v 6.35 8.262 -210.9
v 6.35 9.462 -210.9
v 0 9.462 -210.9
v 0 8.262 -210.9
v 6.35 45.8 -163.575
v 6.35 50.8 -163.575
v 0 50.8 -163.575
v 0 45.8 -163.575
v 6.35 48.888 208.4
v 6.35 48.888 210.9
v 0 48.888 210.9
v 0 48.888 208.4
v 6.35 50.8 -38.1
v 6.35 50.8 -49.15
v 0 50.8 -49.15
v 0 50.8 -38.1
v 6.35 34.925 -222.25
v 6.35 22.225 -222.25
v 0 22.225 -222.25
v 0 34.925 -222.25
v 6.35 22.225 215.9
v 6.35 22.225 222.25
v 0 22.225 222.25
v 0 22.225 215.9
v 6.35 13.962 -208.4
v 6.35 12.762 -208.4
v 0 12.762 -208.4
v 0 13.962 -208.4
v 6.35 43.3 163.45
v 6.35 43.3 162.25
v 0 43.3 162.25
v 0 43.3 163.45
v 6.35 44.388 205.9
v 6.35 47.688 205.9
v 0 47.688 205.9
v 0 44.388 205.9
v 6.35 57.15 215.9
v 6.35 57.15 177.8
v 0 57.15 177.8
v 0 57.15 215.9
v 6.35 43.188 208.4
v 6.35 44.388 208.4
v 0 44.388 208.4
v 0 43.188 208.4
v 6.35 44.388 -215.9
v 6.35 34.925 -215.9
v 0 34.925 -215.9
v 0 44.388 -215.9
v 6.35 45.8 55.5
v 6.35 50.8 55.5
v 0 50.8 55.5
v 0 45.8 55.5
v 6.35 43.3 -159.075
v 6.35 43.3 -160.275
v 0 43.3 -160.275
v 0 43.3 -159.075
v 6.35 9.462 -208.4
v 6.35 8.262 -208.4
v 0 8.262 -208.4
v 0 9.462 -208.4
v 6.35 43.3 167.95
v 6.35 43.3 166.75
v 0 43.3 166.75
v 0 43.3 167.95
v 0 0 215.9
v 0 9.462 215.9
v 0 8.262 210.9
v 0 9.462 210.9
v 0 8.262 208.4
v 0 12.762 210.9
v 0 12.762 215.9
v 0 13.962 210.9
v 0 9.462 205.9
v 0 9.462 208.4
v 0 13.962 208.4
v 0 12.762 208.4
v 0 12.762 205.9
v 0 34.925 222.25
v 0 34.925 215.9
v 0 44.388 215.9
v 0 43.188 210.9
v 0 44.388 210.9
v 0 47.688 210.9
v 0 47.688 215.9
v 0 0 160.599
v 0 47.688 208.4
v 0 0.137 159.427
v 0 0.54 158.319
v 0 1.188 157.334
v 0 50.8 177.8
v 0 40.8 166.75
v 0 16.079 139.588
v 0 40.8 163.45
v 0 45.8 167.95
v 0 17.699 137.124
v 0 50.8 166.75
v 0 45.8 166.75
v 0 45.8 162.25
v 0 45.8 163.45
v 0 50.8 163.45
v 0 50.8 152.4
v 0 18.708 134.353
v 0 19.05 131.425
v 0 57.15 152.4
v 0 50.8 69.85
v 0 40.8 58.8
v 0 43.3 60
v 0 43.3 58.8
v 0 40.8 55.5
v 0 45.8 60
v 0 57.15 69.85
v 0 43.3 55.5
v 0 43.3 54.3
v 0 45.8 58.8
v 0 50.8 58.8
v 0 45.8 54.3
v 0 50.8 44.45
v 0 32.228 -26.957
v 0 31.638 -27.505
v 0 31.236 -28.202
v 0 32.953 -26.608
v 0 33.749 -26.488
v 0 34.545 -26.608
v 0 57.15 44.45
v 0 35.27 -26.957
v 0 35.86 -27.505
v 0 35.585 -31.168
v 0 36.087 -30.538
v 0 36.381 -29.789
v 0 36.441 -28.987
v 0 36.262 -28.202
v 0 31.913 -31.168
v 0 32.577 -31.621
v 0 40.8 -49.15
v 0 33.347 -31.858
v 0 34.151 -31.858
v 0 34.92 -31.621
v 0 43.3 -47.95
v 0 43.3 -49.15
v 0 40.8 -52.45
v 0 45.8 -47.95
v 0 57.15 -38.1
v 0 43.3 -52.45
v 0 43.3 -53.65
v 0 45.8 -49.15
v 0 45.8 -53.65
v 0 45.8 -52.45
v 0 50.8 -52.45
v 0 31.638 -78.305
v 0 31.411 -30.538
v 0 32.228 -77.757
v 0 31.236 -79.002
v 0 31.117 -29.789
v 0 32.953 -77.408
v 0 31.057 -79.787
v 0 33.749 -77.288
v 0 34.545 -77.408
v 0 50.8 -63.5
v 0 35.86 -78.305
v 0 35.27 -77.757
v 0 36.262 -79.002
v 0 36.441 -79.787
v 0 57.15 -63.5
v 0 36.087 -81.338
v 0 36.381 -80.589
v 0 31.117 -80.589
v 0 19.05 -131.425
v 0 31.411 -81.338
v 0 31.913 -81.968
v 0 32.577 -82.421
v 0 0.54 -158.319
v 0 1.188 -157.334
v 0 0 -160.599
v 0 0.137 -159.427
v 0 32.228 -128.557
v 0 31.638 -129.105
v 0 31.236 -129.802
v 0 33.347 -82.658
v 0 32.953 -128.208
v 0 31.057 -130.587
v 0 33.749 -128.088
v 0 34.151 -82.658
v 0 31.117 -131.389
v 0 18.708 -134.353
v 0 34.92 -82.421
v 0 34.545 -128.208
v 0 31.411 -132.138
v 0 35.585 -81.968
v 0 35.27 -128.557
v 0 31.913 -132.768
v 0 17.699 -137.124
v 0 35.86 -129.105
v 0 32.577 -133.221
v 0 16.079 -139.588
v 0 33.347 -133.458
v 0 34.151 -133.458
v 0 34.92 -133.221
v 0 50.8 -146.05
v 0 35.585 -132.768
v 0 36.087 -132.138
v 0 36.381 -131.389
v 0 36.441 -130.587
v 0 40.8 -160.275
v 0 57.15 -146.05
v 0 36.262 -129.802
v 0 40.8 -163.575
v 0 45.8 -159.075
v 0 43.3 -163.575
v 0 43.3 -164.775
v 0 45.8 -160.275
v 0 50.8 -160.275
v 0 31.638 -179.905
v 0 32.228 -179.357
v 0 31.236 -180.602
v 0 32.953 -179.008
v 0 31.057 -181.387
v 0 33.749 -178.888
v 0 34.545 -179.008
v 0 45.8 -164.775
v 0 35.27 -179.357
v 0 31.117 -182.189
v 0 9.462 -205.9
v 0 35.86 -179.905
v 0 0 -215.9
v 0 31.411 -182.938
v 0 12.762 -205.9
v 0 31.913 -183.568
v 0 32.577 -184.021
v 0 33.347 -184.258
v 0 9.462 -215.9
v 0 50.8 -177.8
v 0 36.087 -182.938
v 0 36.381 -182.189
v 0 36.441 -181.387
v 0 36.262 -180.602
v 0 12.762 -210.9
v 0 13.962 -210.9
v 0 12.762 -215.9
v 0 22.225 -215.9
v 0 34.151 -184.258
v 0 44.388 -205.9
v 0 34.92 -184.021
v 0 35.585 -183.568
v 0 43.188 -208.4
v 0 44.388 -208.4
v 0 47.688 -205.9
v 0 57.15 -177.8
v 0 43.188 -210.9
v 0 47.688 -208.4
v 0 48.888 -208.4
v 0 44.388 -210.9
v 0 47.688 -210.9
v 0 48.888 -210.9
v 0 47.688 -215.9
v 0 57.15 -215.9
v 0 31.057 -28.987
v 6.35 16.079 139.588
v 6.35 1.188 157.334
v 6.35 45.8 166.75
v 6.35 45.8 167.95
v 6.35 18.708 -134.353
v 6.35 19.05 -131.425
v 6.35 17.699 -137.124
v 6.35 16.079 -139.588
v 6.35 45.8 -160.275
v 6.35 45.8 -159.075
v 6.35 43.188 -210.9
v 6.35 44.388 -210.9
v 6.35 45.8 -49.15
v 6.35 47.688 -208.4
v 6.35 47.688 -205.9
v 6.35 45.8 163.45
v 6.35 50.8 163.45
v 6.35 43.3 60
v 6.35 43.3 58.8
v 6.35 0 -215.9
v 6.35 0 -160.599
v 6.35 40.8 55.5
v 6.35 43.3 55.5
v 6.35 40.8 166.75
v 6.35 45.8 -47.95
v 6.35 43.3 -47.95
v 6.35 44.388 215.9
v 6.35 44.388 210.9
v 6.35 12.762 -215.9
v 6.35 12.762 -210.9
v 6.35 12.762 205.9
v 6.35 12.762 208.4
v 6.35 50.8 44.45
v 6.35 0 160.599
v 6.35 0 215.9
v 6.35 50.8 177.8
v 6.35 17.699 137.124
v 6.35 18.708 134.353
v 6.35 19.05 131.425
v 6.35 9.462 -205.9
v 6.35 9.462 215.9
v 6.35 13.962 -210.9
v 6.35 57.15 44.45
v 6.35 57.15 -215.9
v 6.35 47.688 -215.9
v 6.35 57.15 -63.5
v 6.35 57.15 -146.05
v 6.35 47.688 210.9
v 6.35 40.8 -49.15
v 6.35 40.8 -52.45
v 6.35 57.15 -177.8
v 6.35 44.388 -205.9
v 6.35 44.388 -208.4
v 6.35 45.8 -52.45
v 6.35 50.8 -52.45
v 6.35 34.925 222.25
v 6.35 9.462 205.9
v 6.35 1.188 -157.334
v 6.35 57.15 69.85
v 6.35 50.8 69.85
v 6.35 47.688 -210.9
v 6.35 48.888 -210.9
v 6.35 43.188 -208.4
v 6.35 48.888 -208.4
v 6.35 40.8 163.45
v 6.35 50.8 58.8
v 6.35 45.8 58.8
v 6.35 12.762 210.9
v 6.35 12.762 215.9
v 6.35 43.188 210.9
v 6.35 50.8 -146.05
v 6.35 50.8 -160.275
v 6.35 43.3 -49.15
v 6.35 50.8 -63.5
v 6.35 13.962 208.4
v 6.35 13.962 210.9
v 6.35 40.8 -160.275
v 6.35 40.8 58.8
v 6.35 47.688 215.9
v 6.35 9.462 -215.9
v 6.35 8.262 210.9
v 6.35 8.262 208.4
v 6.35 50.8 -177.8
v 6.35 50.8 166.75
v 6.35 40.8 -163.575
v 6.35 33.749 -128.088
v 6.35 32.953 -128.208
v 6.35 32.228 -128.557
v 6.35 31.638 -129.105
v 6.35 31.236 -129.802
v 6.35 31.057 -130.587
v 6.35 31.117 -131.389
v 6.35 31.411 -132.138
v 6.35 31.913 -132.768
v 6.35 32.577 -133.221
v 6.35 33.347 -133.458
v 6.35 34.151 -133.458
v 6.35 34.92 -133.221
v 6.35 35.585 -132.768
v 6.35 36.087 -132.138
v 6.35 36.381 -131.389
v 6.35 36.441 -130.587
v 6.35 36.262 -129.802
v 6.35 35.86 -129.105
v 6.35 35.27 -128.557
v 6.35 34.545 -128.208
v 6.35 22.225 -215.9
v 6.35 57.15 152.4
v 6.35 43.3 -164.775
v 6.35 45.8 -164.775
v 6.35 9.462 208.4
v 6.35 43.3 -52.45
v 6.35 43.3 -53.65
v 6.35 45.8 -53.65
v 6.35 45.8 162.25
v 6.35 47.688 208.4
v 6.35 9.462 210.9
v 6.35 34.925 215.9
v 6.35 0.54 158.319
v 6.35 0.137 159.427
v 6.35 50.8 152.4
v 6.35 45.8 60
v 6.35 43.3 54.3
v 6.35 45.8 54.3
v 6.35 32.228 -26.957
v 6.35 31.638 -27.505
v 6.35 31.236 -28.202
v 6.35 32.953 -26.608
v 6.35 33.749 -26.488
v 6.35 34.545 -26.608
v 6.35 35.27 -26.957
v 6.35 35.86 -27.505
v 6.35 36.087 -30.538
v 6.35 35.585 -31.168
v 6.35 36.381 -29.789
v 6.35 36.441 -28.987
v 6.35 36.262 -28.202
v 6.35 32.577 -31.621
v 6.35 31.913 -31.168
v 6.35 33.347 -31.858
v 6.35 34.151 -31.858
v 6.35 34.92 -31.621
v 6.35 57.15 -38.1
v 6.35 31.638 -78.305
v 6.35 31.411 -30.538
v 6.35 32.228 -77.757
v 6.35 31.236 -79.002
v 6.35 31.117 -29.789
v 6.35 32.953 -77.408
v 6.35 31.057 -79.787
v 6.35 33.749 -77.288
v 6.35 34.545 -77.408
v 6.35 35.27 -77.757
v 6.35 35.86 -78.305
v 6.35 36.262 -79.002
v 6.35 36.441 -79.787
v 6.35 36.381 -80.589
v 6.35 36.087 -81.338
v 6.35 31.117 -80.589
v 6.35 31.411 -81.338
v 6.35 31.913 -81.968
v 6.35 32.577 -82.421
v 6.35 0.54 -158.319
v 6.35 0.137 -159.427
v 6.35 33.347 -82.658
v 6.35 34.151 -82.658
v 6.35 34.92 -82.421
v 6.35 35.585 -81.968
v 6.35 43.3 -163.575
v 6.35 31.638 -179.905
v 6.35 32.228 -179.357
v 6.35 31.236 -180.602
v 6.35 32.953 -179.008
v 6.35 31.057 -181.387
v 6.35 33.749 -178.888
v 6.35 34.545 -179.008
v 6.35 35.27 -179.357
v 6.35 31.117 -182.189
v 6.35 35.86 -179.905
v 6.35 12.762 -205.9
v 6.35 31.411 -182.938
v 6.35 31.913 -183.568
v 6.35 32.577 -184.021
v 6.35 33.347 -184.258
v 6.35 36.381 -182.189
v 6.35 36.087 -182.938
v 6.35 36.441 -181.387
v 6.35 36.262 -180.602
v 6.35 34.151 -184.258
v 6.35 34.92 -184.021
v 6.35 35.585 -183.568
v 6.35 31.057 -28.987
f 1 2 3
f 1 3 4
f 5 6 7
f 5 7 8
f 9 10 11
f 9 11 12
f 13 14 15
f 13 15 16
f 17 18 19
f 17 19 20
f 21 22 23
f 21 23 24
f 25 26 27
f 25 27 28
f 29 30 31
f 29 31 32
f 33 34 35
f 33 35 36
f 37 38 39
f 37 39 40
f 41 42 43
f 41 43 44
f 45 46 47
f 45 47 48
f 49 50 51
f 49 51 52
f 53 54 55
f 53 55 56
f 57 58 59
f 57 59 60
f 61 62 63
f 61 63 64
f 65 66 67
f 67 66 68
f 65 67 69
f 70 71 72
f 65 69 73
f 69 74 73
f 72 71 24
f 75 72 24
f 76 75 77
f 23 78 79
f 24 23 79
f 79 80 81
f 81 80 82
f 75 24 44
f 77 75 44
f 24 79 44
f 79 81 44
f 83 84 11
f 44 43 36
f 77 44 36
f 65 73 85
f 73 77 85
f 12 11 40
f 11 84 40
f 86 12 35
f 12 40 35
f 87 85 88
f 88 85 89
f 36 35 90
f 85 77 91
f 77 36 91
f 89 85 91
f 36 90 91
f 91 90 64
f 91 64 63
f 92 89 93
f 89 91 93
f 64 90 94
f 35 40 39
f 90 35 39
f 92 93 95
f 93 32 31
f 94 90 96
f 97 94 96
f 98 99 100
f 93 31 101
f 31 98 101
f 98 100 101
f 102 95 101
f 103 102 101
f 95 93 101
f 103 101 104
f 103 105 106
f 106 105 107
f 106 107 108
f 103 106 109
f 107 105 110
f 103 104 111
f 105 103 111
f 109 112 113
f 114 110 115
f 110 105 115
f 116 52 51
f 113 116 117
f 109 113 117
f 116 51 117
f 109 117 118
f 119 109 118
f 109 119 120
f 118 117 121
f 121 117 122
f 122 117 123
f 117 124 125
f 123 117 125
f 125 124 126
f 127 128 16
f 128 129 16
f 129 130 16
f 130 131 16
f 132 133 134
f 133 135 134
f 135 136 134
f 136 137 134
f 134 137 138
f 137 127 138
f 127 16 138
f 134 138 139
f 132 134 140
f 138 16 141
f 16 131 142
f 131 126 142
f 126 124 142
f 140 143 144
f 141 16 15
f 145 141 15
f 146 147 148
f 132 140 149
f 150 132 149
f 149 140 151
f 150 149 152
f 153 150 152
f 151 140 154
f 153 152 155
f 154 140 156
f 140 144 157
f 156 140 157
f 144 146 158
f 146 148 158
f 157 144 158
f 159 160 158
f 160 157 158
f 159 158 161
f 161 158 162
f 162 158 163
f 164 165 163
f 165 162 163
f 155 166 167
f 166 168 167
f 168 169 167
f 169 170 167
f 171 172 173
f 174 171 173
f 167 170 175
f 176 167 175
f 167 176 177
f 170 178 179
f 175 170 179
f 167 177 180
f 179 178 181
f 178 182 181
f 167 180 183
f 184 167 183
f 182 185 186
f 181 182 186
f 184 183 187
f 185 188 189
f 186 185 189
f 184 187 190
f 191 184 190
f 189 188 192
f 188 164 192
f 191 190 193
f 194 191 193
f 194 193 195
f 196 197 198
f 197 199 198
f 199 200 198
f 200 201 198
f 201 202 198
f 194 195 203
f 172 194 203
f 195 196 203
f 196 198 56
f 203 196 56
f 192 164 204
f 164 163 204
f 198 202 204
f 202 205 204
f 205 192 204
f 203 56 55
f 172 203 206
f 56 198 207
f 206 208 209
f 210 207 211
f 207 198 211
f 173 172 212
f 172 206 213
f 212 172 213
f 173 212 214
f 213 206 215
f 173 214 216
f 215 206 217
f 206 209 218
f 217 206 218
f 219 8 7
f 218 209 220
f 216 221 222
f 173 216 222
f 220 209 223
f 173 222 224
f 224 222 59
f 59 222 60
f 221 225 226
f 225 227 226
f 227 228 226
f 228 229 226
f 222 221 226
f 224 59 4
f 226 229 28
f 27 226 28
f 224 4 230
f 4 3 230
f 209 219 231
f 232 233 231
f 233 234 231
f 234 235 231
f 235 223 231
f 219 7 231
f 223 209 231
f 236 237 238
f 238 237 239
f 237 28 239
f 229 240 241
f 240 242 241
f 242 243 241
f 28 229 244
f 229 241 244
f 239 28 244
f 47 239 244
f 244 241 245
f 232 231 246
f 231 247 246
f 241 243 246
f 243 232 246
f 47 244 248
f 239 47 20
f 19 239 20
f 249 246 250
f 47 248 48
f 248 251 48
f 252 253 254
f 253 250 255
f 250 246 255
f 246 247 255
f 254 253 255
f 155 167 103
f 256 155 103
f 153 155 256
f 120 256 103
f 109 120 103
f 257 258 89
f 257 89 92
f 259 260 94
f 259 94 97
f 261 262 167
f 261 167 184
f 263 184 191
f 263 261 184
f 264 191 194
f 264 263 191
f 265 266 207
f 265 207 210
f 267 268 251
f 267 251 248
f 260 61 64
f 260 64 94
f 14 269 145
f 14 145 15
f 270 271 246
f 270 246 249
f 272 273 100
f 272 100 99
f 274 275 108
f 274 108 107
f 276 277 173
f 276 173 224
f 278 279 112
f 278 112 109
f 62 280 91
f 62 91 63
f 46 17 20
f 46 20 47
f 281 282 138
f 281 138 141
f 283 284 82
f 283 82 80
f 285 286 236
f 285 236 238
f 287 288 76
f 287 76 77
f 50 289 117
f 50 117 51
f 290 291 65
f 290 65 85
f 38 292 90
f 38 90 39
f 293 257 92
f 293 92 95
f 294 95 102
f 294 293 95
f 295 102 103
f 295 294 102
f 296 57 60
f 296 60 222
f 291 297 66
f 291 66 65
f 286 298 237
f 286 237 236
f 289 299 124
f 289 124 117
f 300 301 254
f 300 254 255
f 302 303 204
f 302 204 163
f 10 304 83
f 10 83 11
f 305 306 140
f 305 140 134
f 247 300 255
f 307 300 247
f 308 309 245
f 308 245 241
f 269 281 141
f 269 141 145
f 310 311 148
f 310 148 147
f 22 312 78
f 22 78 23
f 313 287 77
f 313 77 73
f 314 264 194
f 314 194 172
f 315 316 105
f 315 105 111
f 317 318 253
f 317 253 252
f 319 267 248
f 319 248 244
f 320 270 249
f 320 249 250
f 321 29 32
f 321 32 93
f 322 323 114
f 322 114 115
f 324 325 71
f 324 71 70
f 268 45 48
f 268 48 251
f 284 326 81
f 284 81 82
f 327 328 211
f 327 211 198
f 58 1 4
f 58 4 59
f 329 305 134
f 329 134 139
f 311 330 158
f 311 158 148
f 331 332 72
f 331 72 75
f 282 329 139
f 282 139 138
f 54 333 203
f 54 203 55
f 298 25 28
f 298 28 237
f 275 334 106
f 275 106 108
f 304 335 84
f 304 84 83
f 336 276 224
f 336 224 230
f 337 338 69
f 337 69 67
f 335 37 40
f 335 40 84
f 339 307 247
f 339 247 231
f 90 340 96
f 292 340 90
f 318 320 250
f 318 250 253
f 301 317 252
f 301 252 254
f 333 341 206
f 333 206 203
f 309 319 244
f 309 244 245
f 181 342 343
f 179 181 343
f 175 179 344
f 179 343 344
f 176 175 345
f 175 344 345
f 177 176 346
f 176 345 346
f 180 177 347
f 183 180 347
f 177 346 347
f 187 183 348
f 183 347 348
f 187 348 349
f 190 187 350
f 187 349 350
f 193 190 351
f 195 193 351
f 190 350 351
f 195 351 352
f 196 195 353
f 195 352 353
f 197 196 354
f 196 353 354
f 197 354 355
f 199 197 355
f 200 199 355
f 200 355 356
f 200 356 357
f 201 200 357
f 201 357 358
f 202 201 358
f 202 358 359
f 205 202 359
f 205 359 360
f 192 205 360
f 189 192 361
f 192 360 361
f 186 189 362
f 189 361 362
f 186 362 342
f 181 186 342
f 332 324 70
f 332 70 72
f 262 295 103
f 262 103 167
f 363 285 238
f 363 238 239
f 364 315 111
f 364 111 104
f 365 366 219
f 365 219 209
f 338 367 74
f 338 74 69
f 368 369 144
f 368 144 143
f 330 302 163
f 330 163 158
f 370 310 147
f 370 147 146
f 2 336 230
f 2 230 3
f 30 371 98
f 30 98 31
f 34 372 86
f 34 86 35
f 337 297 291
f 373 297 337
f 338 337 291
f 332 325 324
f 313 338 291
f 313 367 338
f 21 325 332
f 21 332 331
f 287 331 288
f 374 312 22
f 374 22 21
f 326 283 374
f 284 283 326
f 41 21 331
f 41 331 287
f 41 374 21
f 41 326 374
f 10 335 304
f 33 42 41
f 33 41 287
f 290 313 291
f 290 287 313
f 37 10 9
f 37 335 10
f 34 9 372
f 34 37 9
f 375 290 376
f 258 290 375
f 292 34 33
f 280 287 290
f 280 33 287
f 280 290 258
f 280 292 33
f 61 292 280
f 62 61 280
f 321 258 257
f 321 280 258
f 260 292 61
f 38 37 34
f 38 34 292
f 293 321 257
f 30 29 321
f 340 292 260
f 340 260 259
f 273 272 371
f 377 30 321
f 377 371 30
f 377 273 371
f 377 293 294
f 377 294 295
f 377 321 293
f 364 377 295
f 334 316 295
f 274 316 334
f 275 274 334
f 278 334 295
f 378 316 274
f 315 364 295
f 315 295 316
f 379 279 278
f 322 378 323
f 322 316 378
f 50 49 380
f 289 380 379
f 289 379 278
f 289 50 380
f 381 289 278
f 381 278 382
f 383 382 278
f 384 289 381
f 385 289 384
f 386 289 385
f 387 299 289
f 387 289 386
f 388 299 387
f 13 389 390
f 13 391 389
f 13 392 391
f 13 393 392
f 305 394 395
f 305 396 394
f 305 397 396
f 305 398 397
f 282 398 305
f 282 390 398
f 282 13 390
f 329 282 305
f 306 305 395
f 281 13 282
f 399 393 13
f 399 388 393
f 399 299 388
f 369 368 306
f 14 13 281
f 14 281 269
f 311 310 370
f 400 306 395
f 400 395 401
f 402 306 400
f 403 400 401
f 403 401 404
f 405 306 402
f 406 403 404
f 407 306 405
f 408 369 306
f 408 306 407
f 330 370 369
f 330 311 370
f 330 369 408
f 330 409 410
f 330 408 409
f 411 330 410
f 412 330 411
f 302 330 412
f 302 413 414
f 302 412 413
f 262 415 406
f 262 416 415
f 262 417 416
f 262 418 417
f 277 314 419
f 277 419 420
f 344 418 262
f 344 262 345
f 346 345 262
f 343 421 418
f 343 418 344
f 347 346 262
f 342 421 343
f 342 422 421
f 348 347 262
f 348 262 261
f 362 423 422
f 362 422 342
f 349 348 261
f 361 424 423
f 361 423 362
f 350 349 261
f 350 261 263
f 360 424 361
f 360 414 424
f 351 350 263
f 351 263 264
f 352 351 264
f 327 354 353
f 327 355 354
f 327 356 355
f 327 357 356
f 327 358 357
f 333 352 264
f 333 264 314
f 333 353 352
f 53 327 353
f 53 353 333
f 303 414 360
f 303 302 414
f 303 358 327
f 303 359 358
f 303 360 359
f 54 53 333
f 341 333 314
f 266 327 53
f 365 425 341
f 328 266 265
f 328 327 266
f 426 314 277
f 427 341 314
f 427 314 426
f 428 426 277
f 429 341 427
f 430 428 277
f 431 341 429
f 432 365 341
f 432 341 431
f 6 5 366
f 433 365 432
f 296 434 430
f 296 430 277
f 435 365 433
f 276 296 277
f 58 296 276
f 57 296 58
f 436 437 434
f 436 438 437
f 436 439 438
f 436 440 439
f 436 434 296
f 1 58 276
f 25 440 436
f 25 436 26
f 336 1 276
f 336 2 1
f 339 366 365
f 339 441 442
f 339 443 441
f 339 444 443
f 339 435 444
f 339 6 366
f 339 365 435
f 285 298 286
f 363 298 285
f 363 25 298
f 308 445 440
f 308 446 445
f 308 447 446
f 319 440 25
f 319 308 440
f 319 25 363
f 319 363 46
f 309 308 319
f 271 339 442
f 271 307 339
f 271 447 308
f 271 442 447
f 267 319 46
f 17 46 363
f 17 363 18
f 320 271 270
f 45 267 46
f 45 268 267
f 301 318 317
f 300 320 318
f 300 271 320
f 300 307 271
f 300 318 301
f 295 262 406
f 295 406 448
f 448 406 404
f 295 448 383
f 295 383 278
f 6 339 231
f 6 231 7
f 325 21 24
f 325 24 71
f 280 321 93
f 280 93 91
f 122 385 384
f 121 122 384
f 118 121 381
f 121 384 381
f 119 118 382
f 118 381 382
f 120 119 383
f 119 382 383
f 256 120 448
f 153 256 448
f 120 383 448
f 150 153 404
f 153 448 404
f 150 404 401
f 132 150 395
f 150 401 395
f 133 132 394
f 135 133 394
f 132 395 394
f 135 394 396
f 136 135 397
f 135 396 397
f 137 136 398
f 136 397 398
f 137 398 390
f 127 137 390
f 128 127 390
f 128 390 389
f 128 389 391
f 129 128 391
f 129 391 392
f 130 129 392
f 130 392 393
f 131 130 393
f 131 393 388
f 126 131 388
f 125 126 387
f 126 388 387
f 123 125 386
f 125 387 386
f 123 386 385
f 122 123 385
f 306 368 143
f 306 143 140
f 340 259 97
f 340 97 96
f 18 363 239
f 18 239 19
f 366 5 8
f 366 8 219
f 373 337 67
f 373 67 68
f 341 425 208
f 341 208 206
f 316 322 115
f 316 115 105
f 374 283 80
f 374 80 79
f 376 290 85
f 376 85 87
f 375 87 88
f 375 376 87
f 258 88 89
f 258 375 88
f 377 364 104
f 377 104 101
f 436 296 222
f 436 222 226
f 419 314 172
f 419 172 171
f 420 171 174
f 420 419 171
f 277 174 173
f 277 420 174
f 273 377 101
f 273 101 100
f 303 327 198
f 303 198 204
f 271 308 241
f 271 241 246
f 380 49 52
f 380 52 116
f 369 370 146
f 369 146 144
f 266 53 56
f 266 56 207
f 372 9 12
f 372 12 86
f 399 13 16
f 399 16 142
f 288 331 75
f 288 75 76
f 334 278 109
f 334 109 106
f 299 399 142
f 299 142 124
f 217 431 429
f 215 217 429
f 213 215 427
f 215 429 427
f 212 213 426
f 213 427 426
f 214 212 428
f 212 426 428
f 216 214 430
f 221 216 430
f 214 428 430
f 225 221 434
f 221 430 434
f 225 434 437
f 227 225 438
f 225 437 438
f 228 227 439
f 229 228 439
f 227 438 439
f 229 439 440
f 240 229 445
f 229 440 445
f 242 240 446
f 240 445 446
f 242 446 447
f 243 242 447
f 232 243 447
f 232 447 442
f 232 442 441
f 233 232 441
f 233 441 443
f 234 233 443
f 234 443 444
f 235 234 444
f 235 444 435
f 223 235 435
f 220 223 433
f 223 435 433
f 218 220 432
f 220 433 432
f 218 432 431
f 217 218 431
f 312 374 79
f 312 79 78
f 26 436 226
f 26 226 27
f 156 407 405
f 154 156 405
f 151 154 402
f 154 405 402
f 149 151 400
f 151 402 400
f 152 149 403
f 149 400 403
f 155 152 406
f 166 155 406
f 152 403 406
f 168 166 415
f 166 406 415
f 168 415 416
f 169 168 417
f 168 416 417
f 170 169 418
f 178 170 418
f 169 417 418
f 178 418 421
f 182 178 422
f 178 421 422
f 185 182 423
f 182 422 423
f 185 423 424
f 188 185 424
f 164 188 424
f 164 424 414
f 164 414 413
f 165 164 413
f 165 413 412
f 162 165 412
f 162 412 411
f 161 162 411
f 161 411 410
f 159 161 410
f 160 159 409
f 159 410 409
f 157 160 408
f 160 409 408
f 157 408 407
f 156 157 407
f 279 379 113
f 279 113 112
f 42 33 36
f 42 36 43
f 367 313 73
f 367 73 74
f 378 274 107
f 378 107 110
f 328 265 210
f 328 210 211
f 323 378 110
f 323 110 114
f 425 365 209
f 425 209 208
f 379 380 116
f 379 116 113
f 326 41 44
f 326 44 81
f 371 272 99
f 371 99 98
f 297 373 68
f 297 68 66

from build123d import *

# Parameters (mm, degrees)
SKETCH1_R           = 2.7
BOSS_EXTRUDE1_DEPTH = 6.35


with BuildPart() as part:
    # Sketch1 → Boss-Extrude1 (new body)
    with BuildSketch(Plane(origin=(6.35, 0, 0), x_dir=(0, 0, -1), z_dir=(1, 0, 0))):
        with BuildLine():
            Line((-44.45, 57.15), (-44.45, 50.8))
            Line((-44.45, 50.8), (-55.5, 50.8))
            Line((-55.5, 50.8), (-55.5, 45.8))
            Line((-55.5, 45.8), (-54.3, 45.8))
            Line((-54.3, 45.8), (-54.3, 43.3))
            Line((-54.3, 43.3), (-55.5, 43.3))
            Line((-55.5, 43.3), (-55.5, 40.8))
            Line((-55.5, 40.8), (-58.8, 40.8))
            Line((-58.8, 40.8), (-58.8, 43.3))
            Line((-58.8, 43.3), (-60, 43.3))
            Line((-60, 43.3), (-60, 45.8))
            Line((-60, 45.8), (-58.8, 45.8))
            Line((-58.8, 45.8), (-58.8, 50.8))
            Line((-58.8, 50.8), (-69.85, 50.8))
            Line((-69.85, 50.8), (-69.85, 57.15))
            Line((-69.85, 57.15), (-152.4, 57.15))
            Line((-152.4, 57.15), (-152.4, 50.8))
            Line((-152.4, 50.8), (-163.45, 50.8))
            Line((-163.45, 50.8), (-163.45, 45.8))
            Line((-163.45, 45.8), (-162.25, 45.8))
            Line((-162.25, 45.8), (-162.25, 43.3))
            Line((-162.25, 43.3), (-163.45, 43.3))
            Line((-163.45, 43.3), (-163.45, 40.8))
            Line((-163.45, 40.8), (-166.75, 40.8))
            Line((-166.75, 40.8), (-166.75, 43.3))
            Line((-166.75, 43.3), (-167.95, 43.3))
            Line((-167.95, 43.3), (-167.95, 45.8))
            Line((-167.95, 45.8), (-166.75, 45.8))
            Line((-166.75, 45.8), (-166.75, 50.8))
            Line((-166.75, 50.8), (-177.8, 50.8))
            Line((-177.8, 50.8), (-177.8, 57.15))
            Line((-177.8, 57.15), (-215.9, 57.15))
            Line((-215.9, 57.15), (-215.9, 47.6875))
            Line((-215.9, 47.6875), (-210.9, 47.6875))
            Line((-210.9, 47.6875), (-210.9, 48.8875))
            Line((-210.9, 48.8875), (-208.4, 48.8875))
            Line((-208.4, 48.8875), (-208.4, 47.6875))
            Line((-208.4, 47.6875), (-205.9, 47.6875))
            Line((-205.9, 47.6875), (-205.9, 44.3875))
            Line((-205.9, 44.3875), (-208.4, 44.3875))
            Line((-208.4, 44.3875), (-208.4, 43.1875))
            Line((-208.4, 43.1875), (-210.9, 43.1875))
            Line((-210.9, 43.1875), (-210.9, 44.3875))
            Line((-210.9, 44.3875), (-215.9, 44.3875))
            Line((-215.9, 44.3875), (-215.9, 34.925))
            Line((-215.9, 34.925), (-222.25, 34.925))
            Line((-222.25, 34.925), (-222.25, 22.225))
            Line((-222.25, 22.225), (-215.9, 22.225))
            Line((-215.9, 22.225), (-215.9, 12.7625))
            Line((-215.9, 12.7625), (-210.9, 12.7625))
            Line((-210.9, 12.7625), (-210.9, 13.9625))
            Line((-210.9, 13.9625), (-208.4, 13.9625))
            Line((-208.4, 13.9625), (-208.4, 12.7625))
            Line((-208.4, 12.7625), (-205.9, 12.7625))
            Line((-205.9, 12.7625), (-205.9, 9.4625))
            Line((-205.9, 9.4625), (-208.4, 9.4625))
            Line((-208.4, 9.4625), (-208.4, 8.2625))
            Line((-208.4, 8.2625), (-210.9, 8.2625))
            Line((-210.9, 8.2625), (-210.9, 9.4625))
            Line((-210.9, 9.4625), (-215.9, 9.4625))
            Line((-215.9, 9.4625), (-215.9, 0))
            Line((-215.9, 0), (-160.59896879, 0))
            ThreePointArc((-160.59896879, 0), (-158.861506462, 0.306361486), (-157.333607733, 1.188494229))
            Line((-157.333607733, 1.188494229), (-139.588074729, 16.078764428))
            ThreePointArc((-139.588074729, 16.078764428), (-135.768327906, 18.284096284), (-131.424672086, 19.05))
            Line((-131.424672086, 19.05), (131.424672086, 19.05))
            ThreePointArc((131.424672086, 19.05), (135.768327906, 18.284096284), (139.588074729, 16.078764428))
            Line((139.588074729, 16.078764428), (157.333607733, 1.188494229))
            ThreePointArc((157.333607733, 1.188494229), (158.861506462, 0.306361486), (160.59896879, 0))
            Line((160.59896879, 0), (215.9, 0))
            Line((215.9, 0), (215.9, 9.4625))
            Line((215.9, 9.4625), (210.9, 9.4625))
            Line((210.9, 9.4625), (210.9, 8.2625))
            Line((210.9, 8.2625), (208.4, 8.2625))
            Line((208.4, 8.2625), (208.4, 9.4625))
            Line((208.4, 9.4625), (205.9, 9.4625))
            Line((205.9, 9.4625), (205.9, 12.7625))
            Line((205.9, 12.7625), (208.4, 12.7625))
            Line((208.4, 12.7625), (208.4, 13.9625))
            Line((208.4, 13.9625), (210.9, 13.9625))
            Line((210.9, 13.9625), (210.9, 12.7625))
            Line((210.9, 12.7625), (215.9, 12.7625))
            Line((215.9, 12.7625), (215.9, 22.225))
            Line((215.9, 22.225), (222.25, 22.225))
            Line((222.25, 22.225), (222.25, 34.925))
            Line((222.25, 34.925), (215.9, 34.925))
            Line((215.9, 34.925), (215.9, 44.3875))
            Line((215.9, 44.3875), (210.9, 44.3875))
            Line((210.9, 44.3875), (210.9, 43.1875))
            Line((210.9, 43.1875), (208.4, 43.1875))
            Line((208.4, 43.1875), (208.4, 44.3875))
            Line((208.4, 44.3875), (205.9, 44.3875))
            Line((205.9, 44.3875), (205.9, 47.6875))
            Line((205.9, 47.6875), (208.4, 47.6875))
            Line((208.4, 47.6875), (208.4, 48.8875))
            Line((208.4, 48.8875), (210.9, 48.8875))
            Line((210.9, 48.8875), (210.9, 47.6875))
            Line((210.9, 47.6875), (215.9, 47.6875))
            Line((215.9, 47.6875), (215.9, 57.15))
            Line((215.9, 57.15), (177.8, 57.15))
            Line((177.8, 57.15), (177.8, 50.8))
            Line((177.8, 50.8), (163.575, 50.8))
            Line((163.575, 50.8), (163.575, 45.8))
            Line((163.575, 45.8), (164.775, 45.8))
            Line((164.775, 45.8), (164.775, 43.3))
            Line((164.775, 43.3), (163.575, 43.3))
            Line((163.575, 43.3), (163.575, 40.8))
            Line((163.575, 40.8), (160.275, 40.8))
            Line((160.275, 40.8), (160.275, 43.3))
            Line((160.275, 43.3), (159.075, 43.3))
            Line((159.075, 43.3), (159.075, 45.8))
            Line((159.075, 45.8), (160.275, 45.8))
            Line((160.275, 45.8), (160.275, 50.8))
            Line((160.275, 50.8), (146.05, 50.8))
            Line((146.05, 50.8), (146.05, 57.15))
            Line((146.05, 57.15), (63.5, 57.15))
            Line((63.5, 57.15), (63.5, 50.8))
            Line((63.5, 50.8), (52.45, 50.8))
            Line((52.45, 50.8), (52.45, 45.8))
            Line((52.45, 45.8), (53.65, 45.8))
            Line((53.65, 45.8), (53.65, 43.3))
            Line((53.65, 43.3), (52.45, 43.3))
            Line((52.45, 43.3), (52.45, 40.8))
            Line((52.45, 40.8), (49.15, 40.8))
            Line((49.15, 40.8), (49.15, 43.3))
            Line((49.15, 43.3), (47.95, 43.3))
            Line((47.95, 43.3), (47.95, 45.8))
            Line((47.95, 45.8), (49.15, 45.8))
            Line((49.15, 45.8), (49.15, 50.8))
            Line((49.15, 50.8), (38.1, 50.8))
            Line((38.1, 50.8), (38.1, 57.15))
            Line((38.1, 57.15), (-44.45, 57.15))
        make_face()
        with Locations(Location((79.988301448, 33.74898, 0), (0, 0, 180))):
            Circle(SKETCH1_R, mode=Mode.SUBTRACT)
        with Locations(Location((130.788301448, 33.74898, 0), (0, 0, 180))):
            Circle(SKETCH1_R, mode=Mode.SUBTRACT)
        with Locations(Location((29.188301448, 33.74898, 0), (0, 0, 180))):
            Circle(SKETCH1_R, mode=Mode.SUBTRACT)
        with Locations(Location((181.588301448, 33.74898, 0), (0, 0, 180))):
            Circle(SKETCH1_R, mode=Mode.SUBTRACT)
    extrude(amount=-BOSS_EXTRUDE1_DEPTH)


solid = part.part
